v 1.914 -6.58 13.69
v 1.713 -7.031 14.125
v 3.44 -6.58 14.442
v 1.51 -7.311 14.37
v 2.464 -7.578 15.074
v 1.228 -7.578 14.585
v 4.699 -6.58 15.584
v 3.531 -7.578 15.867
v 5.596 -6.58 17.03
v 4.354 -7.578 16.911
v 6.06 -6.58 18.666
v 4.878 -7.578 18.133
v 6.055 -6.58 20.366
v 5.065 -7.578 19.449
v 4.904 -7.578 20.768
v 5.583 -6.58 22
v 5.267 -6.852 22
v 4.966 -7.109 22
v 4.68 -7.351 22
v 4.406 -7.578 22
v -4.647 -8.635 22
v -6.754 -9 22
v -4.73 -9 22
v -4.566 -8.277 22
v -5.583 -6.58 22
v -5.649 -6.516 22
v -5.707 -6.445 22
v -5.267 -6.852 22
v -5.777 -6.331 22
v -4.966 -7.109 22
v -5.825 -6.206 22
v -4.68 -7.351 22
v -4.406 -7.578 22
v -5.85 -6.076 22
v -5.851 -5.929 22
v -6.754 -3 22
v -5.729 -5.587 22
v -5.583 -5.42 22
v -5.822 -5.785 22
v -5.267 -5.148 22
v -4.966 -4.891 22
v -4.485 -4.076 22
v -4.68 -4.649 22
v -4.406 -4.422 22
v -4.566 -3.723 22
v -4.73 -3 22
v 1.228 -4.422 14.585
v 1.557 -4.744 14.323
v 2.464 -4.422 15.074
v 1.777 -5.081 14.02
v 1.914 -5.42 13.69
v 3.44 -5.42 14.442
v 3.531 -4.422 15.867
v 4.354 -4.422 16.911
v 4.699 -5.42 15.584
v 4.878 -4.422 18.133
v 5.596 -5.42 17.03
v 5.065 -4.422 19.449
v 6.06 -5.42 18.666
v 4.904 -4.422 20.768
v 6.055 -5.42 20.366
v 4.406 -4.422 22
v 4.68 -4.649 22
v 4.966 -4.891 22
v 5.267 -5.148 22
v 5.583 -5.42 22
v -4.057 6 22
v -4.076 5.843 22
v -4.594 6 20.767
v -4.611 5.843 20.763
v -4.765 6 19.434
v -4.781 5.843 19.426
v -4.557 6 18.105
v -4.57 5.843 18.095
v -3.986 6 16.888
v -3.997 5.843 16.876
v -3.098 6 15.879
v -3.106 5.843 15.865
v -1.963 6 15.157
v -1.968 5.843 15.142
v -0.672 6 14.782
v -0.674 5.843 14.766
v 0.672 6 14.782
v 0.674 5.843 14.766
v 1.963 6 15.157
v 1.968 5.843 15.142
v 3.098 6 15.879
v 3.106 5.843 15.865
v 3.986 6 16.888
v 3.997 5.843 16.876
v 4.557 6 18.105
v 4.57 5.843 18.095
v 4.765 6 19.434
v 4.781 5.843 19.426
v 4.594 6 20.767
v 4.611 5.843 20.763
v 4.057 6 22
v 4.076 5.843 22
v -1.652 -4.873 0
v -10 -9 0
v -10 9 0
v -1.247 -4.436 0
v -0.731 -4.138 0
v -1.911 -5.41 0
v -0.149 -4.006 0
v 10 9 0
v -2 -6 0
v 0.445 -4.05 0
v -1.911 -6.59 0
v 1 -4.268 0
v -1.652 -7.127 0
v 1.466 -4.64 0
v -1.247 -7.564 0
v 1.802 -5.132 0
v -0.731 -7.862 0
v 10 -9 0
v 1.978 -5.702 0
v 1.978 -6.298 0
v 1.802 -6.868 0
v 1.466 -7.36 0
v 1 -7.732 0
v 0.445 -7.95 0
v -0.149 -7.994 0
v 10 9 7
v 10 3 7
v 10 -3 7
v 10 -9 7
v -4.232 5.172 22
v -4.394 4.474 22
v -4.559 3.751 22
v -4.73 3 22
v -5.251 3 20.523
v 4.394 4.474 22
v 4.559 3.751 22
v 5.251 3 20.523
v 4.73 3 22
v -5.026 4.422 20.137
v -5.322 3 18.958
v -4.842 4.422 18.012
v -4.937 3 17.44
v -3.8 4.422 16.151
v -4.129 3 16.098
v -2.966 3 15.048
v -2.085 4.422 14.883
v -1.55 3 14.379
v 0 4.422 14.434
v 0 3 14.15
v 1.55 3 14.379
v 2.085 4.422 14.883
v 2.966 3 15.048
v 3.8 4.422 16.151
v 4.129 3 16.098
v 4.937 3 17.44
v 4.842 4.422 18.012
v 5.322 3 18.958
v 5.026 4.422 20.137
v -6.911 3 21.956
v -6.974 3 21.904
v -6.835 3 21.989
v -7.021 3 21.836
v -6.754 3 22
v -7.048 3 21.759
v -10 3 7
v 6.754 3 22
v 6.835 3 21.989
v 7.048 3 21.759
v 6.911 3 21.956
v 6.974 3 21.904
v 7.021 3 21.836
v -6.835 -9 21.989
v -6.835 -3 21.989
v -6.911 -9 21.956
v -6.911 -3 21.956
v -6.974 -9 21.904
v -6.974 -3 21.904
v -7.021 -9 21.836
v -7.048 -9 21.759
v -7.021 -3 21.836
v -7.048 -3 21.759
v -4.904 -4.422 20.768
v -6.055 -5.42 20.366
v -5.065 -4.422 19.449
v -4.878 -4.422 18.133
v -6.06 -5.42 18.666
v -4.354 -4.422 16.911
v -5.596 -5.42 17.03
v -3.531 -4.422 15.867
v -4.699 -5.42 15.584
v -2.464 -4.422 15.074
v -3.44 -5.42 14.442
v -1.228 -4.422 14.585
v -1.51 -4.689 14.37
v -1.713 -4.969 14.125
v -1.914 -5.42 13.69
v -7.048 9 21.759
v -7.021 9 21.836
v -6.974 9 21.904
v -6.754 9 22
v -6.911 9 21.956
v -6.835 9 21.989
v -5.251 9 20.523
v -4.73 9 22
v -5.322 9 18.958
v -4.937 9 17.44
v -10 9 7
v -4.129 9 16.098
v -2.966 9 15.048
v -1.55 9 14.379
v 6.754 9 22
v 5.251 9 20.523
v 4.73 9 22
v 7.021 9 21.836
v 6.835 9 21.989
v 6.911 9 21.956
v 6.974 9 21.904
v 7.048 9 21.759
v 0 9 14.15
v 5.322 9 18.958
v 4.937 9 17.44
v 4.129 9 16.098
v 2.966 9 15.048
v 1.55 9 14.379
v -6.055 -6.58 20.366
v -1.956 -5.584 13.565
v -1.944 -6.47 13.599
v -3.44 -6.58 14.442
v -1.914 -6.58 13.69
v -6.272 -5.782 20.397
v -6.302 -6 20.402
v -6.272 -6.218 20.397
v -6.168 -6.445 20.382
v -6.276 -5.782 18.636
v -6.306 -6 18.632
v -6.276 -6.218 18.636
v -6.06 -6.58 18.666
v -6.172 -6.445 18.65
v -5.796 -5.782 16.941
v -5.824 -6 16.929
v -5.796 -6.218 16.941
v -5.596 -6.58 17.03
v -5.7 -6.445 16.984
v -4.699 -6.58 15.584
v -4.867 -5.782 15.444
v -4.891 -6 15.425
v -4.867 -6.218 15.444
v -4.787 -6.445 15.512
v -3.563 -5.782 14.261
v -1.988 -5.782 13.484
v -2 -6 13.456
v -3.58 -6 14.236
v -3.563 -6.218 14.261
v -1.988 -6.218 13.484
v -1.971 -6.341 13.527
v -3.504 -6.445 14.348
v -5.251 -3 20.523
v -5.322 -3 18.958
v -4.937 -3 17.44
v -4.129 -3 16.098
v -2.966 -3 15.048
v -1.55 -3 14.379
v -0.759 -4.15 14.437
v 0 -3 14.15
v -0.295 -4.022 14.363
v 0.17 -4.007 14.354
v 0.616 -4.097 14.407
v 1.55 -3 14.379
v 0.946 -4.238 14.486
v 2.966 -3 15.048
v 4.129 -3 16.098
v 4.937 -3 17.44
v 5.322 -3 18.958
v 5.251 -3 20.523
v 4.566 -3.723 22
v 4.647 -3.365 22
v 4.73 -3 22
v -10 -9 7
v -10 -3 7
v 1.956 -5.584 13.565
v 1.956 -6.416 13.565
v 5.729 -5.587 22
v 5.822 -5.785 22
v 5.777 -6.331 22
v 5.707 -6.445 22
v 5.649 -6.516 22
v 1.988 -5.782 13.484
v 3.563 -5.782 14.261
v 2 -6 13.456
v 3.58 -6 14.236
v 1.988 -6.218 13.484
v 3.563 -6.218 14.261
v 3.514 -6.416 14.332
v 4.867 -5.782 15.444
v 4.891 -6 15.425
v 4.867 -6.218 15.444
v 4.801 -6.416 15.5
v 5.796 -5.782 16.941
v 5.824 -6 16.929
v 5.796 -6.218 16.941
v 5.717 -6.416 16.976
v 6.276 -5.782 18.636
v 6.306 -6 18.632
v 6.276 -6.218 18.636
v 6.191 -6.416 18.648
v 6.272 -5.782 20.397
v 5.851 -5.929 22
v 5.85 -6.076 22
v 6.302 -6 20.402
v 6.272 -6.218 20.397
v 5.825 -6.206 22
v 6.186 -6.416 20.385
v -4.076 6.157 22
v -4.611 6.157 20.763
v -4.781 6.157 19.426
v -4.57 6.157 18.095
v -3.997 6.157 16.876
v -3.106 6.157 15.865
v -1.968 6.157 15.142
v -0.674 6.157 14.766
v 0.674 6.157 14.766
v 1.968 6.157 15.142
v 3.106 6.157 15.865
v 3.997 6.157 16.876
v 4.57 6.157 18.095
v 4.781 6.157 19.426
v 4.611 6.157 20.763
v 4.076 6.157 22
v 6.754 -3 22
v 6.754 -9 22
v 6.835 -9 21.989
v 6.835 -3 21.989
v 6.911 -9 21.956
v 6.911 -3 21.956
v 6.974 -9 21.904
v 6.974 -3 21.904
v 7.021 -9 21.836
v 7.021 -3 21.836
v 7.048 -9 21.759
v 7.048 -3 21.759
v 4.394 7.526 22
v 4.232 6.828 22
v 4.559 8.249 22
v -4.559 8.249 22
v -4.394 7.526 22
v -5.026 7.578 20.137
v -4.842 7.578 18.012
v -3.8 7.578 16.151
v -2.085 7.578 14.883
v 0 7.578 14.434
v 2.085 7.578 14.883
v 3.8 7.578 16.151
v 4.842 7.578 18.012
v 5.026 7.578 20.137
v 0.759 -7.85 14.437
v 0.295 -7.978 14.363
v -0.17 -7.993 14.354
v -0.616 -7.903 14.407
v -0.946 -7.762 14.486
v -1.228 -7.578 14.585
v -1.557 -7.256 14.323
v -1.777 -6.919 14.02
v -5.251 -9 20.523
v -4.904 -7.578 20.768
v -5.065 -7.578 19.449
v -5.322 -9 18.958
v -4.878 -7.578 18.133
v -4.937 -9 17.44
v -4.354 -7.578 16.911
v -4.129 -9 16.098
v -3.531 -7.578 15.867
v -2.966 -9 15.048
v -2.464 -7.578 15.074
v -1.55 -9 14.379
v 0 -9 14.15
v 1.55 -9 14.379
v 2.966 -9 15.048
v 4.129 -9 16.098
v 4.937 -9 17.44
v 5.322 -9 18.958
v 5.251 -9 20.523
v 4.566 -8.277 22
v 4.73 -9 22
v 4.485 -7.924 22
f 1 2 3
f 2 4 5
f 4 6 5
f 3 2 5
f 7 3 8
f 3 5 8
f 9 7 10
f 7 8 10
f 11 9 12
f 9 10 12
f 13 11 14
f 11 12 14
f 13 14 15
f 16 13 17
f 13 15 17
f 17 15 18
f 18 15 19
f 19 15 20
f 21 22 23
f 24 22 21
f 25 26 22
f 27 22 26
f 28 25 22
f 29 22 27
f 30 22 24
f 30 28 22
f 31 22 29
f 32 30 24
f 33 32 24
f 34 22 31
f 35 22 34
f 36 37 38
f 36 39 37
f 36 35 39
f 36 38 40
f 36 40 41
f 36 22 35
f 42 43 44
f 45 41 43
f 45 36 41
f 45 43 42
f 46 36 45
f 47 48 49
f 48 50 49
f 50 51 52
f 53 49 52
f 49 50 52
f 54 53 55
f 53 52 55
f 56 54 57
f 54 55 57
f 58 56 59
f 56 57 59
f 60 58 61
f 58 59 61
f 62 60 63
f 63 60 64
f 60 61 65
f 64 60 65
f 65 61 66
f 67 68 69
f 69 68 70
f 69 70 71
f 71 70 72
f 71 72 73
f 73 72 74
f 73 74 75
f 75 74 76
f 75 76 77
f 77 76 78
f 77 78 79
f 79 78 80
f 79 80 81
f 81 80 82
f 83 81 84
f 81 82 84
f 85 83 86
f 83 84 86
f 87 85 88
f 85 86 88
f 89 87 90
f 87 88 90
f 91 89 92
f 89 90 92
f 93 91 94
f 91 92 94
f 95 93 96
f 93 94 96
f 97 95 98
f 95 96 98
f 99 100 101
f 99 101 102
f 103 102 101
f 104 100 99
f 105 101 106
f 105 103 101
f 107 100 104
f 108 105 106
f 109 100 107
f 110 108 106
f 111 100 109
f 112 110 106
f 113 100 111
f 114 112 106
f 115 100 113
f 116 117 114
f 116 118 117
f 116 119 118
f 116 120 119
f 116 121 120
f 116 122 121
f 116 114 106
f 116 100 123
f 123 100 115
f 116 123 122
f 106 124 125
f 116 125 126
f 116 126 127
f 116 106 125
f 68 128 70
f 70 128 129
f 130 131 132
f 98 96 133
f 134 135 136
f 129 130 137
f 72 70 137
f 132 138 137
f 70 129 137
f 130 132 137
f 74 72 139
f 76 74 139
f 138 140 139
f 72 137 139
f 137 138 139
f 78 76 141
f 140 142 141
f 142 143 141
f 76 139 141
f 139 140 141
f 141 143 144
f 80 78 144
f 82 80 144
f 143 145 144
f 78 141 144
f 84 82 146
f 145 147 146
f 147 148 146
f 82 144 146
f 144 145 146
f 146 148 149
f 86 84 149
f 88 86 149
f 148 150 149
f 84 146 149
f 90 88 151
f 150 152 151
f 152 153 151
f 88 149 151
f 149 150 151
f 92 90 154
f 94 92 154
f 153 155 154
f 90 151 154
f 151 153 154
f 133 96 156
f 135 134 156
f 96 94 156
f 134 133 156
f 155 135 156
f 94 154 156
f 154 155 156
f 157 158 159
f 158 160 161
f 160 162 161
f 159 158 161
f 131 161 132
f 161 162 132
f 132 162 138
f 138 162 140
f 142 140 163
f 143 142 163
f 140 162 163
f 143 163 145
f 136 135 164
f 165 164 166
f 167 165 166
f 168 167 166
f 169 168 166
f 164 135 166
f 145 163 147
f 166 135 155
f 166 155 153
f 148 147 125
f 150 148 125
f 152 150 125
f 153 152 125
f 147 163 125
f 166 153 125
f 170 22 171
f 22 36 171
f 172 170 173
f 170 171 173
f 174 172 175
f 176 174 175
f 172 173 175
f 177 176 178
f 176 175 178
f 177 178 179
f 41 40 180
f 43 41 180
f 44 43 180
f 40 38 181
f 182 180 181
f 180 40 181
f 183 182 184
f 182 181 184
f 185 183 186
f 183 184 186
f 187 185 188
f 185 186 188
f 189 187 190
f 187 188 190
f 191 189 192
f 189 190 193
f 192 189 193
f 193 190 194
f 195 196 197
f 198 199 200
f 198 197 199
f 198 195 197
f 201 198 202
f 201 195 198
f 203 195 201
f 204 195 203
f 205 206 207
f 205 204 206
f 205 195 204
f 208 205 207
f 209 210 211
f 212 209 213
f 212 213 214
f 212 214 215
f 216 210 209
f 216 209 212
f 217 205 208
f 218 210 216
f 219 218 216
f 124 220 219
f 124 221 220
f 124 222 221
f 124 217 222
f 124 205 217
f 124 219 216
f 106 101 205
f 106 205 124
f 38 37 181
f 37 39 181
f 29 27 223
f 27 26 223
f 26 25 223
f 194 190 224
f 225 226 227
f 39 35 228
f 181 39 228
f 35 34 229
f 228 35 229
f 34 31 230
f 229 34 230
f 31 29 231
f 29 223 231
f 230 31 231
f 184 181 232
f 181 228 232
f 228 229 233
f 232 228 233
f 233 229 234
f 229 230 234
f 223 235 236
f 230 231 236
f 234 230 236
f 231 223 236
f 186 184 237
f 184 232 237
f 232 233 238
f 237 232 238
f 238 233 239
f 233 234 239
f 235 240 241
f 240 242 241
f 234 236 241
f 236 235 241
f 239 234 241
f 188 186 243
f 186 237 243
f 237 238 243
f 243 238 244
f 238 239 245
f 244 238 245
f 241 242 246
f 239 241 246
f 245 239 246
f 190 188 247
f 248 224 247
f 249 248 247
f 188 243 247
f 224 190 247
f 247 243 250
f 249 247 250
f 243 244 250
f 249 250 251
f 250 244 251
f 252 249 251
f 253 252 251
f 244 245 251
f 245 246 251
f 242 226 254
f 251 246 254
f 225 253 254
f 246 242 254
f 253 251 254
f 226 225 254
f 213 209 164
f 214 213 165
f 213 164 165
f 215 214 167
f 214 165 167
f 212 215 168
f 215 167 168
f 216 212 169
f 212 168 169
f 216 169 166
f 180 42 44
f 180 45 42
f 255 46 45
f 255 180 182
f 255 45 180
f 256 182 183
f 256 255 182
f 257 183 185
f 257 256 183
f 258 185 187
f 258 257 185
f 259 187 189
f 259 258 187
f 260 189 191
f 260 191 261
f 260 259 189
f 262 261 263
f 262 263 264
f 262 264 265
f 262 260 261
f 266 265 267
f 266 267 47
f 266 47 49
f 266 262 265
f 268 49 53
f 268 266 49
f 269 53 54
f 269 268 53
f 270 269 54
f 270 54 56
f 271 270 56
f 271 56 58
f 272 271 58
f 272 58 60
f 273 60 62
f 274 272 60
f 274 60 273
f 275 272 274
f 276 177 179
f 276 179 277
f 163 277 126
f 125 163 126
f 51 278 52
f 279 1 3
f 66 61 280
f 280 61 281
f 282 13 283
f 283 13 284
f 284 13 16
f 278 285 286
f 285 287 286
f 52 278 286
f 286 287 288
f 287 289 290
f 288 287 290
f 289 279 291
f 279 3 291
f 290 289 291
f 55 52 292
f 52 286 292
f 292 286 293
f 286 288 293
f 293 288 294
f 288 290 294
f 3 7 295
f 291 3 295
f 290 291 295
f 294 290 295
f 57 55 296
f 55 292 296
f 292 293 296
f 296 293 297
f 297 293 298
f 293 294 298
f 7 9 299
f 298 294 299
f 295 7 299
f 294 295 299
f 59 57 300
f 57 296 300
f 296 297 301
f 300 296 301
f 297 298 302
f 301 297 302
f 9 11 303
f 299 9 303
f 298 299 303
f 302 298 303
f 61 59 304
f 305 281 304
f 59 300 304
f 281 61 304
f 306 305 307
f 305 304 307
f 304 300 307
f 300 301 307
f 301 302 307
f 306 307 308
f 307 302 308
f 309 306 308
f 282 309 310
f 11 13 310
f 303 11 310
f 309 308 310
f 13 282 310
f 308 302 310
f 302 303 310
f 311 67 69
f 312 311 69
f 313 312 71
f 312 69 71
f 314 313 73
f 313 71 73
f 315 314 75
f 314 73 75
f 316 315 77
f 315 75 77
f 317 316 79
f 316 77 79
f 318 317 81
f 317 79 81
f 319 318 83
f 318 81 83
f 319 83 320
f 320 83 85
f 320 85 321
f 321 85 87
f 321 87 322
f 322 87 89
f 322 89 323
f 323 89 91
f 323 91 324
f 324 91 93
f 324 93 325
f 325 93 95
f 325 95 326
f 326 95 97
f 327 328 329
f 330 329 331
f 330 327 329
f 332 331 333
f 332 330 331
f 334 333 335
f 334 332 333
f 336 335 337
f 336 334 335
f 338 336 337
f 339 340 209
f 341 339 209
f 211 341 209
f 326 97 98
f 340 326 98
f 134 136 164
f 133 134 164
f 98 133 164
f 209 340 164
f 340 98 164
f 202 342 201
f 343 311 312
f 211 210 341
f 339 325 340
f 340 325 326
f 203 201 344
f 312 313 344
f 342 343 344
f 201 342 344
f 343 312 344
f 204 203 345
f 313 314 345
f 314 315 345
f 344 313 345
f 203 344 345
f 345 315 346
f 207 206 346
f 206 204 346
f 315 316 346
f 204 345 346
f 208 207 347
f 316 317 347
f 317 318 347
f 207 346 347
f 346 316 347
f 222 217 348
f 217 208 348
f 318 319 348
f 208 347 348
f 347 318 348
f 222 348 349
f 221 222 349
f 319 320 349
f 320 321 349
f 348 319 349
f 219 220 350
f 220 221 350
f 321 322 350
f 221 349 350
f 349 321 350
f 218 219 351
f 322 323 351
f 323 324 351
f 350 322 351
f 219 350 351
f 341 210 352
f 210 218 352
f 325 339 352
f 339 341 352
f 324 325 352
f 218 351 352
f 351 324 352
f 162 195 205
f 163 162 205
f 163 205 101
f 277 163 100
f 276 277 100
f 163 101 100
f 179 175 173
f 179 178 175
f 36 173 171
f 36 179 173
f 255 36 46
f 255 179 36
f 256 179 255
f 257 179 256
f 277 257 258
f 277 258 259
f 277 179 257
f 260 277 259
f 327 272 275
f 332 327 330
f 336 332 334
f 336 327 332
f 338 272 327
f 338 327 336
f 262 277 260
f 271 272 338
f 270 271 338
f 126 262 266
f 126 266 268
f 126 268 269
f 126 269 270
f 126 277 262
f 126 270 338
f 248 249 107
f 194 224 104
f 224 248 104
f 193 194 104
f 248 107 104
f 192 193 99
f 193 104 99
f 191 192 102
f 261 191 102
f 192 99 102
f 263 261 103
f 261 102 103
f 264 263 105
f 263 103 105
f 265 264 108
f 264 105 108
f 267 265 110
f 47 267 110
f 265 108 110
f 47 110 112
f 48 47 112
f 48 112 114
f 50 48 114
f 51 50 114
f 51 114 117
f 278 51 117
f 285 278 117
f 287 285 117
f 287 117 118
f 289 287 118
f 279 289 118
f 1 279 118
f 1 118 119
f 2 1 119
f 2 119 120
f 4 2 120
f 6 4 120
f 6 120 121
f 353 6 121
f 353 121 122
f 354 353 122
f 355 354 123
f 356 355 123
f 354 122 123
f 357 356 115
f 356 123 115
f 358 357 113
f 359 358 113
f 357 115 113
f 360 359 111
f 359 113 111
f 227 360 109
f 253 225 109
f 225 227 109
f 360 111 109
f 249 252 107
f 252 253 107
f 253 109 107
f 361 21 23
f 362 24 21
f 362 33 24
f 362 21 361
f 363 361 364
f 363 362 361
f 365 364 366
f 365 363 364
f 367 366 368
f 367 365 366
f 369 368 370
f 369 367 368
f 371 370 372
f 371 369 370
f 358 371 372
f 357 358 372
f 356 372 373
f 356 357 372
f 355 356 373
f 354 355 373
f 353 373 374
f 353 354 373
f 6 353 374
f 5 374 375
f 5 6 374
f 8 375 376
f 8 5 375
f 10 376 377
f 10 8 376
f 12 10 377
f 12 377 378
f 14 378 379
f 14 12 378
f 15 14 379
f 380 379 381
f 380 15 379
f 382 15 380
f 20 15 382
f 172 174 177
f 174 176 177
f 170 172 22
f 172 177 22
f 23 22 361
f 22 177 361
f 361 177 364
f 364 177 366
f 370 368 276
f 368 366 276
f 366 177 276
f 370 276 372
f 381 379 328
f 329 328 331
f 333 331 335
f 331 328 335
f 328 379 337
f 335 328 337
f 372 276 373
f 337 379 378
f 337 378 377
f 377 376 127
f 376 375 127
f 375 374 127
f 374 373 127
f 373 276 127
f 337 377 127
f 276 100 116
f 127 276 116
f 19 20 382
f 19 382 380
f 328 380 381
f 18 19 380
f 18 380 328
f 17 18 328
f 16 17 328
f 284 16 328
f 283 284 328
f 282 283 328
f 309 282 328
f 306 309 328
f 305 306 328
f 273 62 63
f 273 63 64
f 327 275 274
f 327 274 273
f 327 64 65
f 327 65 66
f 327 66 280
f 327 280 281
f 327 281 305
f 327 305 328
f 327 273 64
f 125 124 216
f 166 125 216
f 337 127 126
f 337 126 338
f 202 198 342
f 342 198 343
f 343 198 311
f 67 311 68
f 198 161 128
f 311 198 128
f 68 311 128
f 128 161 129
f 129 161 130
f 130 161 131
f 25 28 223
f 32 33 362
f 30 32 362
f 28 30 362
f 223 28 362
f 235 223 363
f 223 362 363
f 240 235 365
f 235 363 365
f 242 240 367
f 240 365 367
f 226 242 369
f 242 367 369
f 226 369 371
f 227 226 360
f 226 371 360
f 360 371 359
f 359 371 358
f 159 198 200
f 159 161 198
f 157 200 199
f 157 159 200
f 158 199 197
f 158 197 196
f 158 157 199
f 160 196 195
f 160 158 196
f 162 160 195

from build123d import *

# Parameters (mm, degrees)
SKETCH1_W               = 20
SKETCH1_H               = 18
BOSS_EXTRUDE1_DEPTH     = 7
SKETCH2_W               = 20
SKETCH2_H               = 6
BOSS_EXTRUDE2_DEPTH     = 15
CUT_EXTRUDE1_REACH      = 32.133
SKETCH3_R               = 5.35
SKETCH5_W               = 14
SKETCH5_H               = 6
CUT_EXTRUDE2_DEPTH      = 26.787593916
FILLET1_R               = 0.3
SKETCH6_W               = 20
SKETCH6_H               = 9
CUT_EXTRUDE3_DEPTH      = 21.149441799
CUT_EXTRUDE3_DEPTH_BACK = 21.149441799
SKETCH7_R               = 2
CUT_EXTRUDE4_DEPTH      = 26.787594037
CUT_EXTRUDE4_DEPTH_BACK = 26.787594037


with BuildPart() as part:
    # Sketch1 → Boss-Extrude1 (new body)
    with BuildSketch(Plane.XY):
        Rectangle(SKETCH1_W, SKETCH1_H)
    extrude(amount=BOSS_EXTRUDE1_DEPTH)

    # Sketch2 → Boss-Extrude2 (add)
    with BuildSketch(Plane.XY.offset(7)):
        with Locations((0, -6)):
            Rectangle(SKETCH2_W, SKETCH2_H)
        with Locations((0, 6)):
            Rectangle(SKETCH2_W, SKETCH2_H)
    extrude(amount=BOSS_EXTRUDE2_DEPTH)

    # Cut-Extrude1: up to this face of the body (flat: up to its plane)
    cut_extrude1_end = Plane(part.part.faces().sort_by_distance((0, 9, 11))[0])
    # Sketch3 → Cut-Extrude1 (cut, up to the picked face)
    with BuildSketch(Plane.XZ.offset(9), mode=Mode.PRIVATE) as cut_extrude1_sk1:
        with Locations((0, 19.5)):
            Circle(SKETCH3_R)
    cut_extrude1_tool1 = split(extrude(cut_extrude1_sk1.sketch, amount=-CUT_EXTRUDE1_REACH, mode=Mode.PRIVATE), bisect_by=cut_extrude1_end, keep=Keep.BOTH, mode=Mode.PRIVATE)
    # Sketch3 → Cut-Extrude1 (cut, up to the picked face)
    with BuildSketch(Plane.XZ.offset(9), mode=Mode.PRIVATE) as cut_extrude1_sk2:
        Polygon((-7, 22), (-10, 7), (-10, 22), align=None)
    cut_extrude1_tool2 = split(extrude(cut_extrude1_sk2.sketch, amount=-CUT_EXTRUDE1_REACH, mode=Mode.PRIVATE), bisect_by=cut_extrude1_end, keep=Keep.BOTH, mode=Mode.PRIVATE)
    # Sketch3 → Cut-Extrude1 (cut, up to the picked face)
    with BuildSketch(Plane.XZ.offset(9), mode=Mode.PRIVATE) as cut_extrude1_sk3:
        Polygon((7, 22), (10, 22), (10, 7), align=None)
    cut_extrude1_tool3 = split(extrude(cut_extrude1_sk3.sketch, amount=-CUT_EXTRUDE1_REACH, mode=Mode.PRIVATE), bisect_by=cut_extrude1_end, keep=Keep.BOTH, mode=Mode.PRIVATE)
    add(cut_extrude1_tool1.solids().sort_by(Axis((0, -9, 19.5), (0, 1, 0)))[0], mode=Mode.SUBTRACT)
    add(cut_extrude1_tool2.solids().sort_by(Axis((-9, -9, 17), (0, 1, 0)))[0], mode=Mode.SUBTRACT)
    add(cut_extrude1_tool3.solids().sort_by(Axis((9, -9, 17), (0, 1, 0)))[0], mode=Mode.SUBTRACT)

    # Sketch4 → Revolve4 (revolve)
    with BuildSketch(Plane.XY.offset(19.5), mode=Mode.PRIVATE) as revolve4_sk:
        with BuildLine():
            Line((-4.781378582, -5.843107092), (-5.35, -3))
            Line((-5.35, -3), (-5.35, -6))
            Line((-5.35, -6), (-4.765843122, -6))
            ThreePointArc((-4.765843122, -6), (-4.769736461, -5.921169906), (-4.781378582, -5.843107092))
        make_face()
        with BuildLine():
            Line((-4.765843122, -6), (-5.35, -6))
            Line((-5.35, -6), (-5.35, -9))
            Line((-5.35, -9), (-4.781378582, -6.156892908))
            ThreePointArc((-4.781378582, -6.156892908), (-4.769736461, -6.078830094), (-4.765843122, -6))
        make_face()
    revolve(revolve4_sk.sketch.rotate(Axis((0, -3, 19.5), (0, -1, 0)), 270), axis=Axis((0, -3, 19.5), (0, -1, 0)))

    # Sketch5 → Cut-Extrude2 (cut, through all)
    with BuildSketch(Plane.XY.offset(22)):
        with Locations((0, -6)):
            Rectangle(SKETCH5_W, SKETCH5_H)
    extrude(amount=CUT_EXTRUDE2_DEPTH, mode=Mode.SUBTRACT)

    # Fillet1
    fillet1_edges = [part.edges().sort_by_distance(p)[0] for p in [
        (7, -6, 22),
        (-7, -6, 22),
        (-7, 6, 22),
        (7, 6, 22),
        (-4.729957717, 6, 22),
        (4.729957717, 6, 22),
    ]]
    fillet(fillet1_edges, radius=FILLET1_R)

    # Sketch6 → Cut-Extrude3 (cut, two sides)
    with BuildSketch(Plane.XY.offset(7)) as cut_extrude3_sk:
        with Locations((0, 4.5)):
            Rectangle(SKETCH6_W, SKETCH6_H)
    extrude(amount=CUT_EXTRUDE3_DEPTH, mode=Mode.SUBTRACT)
    extrude(cut_extrude3_sk.sketch, amount=-CUT_EXTRUDE3_DEPTH_BACK, mode=Mode.SUBTRACT)

    # Mirror2: part across plane


with BuildPart() as part_1:
    add(part.part)
    add(part.part.mirror(Plane(origin=(-10, 0, 0), x_dir=(0, 0, 1), z_dir=(0, -1, 0))))

    # Sketch7 → Cut-Extrude4 (cut, two sides)
    with BuildSketch(Plane(origin=(0, 0, 0), x_dir=(-1, 0, 0), z_dir=(0, 0, -1))) as cut_extrude4_sk:
        with Locations((0, -6)):
            Circle(SKETCH7_R)
    extrude(amount=CUT_EXTRUDE4_DEPTH, mode=Mode.SUBTRACT)
    extrude(cut_extrude4_sk.sketch, amount=-CUT_EXTRUDE4_DEPTH_BACK, mode=Mode.SUBTRACT)

    # Sketch8 → Cut-Revolve1 (revolve, cut)
    with BuildSketch(Plane.XY.offset(19.5)):
        with BuildLine():
            Line((-6.116799524, -6.580040554), (-5.065689291, -7.578446454))
            Line((-5.065689291, -7.578446454), (-4.781378582, -6.156892908))
            ThreePointArc((-4.781378582, -6.156892908), (-4.765843122, -6), (-4.781378582, -5.843107092))
            Line((-4.781378582, -5.843107092), (-5.065689291, -4.421553546))
            Line((-5.065689291, -4.421553546), (-6.116799524, -5.419959446))
            ThreePointArc((-6.116799524, -5.419959446), (-6.365843122, -6), (-6.116799524, -6.580040554))
        make_face()
    revolve(axis=Axis((0, -3, 19.5), (0, -1, 0)), mode=Mode.SUBTRACT)


solid = part_1.part
